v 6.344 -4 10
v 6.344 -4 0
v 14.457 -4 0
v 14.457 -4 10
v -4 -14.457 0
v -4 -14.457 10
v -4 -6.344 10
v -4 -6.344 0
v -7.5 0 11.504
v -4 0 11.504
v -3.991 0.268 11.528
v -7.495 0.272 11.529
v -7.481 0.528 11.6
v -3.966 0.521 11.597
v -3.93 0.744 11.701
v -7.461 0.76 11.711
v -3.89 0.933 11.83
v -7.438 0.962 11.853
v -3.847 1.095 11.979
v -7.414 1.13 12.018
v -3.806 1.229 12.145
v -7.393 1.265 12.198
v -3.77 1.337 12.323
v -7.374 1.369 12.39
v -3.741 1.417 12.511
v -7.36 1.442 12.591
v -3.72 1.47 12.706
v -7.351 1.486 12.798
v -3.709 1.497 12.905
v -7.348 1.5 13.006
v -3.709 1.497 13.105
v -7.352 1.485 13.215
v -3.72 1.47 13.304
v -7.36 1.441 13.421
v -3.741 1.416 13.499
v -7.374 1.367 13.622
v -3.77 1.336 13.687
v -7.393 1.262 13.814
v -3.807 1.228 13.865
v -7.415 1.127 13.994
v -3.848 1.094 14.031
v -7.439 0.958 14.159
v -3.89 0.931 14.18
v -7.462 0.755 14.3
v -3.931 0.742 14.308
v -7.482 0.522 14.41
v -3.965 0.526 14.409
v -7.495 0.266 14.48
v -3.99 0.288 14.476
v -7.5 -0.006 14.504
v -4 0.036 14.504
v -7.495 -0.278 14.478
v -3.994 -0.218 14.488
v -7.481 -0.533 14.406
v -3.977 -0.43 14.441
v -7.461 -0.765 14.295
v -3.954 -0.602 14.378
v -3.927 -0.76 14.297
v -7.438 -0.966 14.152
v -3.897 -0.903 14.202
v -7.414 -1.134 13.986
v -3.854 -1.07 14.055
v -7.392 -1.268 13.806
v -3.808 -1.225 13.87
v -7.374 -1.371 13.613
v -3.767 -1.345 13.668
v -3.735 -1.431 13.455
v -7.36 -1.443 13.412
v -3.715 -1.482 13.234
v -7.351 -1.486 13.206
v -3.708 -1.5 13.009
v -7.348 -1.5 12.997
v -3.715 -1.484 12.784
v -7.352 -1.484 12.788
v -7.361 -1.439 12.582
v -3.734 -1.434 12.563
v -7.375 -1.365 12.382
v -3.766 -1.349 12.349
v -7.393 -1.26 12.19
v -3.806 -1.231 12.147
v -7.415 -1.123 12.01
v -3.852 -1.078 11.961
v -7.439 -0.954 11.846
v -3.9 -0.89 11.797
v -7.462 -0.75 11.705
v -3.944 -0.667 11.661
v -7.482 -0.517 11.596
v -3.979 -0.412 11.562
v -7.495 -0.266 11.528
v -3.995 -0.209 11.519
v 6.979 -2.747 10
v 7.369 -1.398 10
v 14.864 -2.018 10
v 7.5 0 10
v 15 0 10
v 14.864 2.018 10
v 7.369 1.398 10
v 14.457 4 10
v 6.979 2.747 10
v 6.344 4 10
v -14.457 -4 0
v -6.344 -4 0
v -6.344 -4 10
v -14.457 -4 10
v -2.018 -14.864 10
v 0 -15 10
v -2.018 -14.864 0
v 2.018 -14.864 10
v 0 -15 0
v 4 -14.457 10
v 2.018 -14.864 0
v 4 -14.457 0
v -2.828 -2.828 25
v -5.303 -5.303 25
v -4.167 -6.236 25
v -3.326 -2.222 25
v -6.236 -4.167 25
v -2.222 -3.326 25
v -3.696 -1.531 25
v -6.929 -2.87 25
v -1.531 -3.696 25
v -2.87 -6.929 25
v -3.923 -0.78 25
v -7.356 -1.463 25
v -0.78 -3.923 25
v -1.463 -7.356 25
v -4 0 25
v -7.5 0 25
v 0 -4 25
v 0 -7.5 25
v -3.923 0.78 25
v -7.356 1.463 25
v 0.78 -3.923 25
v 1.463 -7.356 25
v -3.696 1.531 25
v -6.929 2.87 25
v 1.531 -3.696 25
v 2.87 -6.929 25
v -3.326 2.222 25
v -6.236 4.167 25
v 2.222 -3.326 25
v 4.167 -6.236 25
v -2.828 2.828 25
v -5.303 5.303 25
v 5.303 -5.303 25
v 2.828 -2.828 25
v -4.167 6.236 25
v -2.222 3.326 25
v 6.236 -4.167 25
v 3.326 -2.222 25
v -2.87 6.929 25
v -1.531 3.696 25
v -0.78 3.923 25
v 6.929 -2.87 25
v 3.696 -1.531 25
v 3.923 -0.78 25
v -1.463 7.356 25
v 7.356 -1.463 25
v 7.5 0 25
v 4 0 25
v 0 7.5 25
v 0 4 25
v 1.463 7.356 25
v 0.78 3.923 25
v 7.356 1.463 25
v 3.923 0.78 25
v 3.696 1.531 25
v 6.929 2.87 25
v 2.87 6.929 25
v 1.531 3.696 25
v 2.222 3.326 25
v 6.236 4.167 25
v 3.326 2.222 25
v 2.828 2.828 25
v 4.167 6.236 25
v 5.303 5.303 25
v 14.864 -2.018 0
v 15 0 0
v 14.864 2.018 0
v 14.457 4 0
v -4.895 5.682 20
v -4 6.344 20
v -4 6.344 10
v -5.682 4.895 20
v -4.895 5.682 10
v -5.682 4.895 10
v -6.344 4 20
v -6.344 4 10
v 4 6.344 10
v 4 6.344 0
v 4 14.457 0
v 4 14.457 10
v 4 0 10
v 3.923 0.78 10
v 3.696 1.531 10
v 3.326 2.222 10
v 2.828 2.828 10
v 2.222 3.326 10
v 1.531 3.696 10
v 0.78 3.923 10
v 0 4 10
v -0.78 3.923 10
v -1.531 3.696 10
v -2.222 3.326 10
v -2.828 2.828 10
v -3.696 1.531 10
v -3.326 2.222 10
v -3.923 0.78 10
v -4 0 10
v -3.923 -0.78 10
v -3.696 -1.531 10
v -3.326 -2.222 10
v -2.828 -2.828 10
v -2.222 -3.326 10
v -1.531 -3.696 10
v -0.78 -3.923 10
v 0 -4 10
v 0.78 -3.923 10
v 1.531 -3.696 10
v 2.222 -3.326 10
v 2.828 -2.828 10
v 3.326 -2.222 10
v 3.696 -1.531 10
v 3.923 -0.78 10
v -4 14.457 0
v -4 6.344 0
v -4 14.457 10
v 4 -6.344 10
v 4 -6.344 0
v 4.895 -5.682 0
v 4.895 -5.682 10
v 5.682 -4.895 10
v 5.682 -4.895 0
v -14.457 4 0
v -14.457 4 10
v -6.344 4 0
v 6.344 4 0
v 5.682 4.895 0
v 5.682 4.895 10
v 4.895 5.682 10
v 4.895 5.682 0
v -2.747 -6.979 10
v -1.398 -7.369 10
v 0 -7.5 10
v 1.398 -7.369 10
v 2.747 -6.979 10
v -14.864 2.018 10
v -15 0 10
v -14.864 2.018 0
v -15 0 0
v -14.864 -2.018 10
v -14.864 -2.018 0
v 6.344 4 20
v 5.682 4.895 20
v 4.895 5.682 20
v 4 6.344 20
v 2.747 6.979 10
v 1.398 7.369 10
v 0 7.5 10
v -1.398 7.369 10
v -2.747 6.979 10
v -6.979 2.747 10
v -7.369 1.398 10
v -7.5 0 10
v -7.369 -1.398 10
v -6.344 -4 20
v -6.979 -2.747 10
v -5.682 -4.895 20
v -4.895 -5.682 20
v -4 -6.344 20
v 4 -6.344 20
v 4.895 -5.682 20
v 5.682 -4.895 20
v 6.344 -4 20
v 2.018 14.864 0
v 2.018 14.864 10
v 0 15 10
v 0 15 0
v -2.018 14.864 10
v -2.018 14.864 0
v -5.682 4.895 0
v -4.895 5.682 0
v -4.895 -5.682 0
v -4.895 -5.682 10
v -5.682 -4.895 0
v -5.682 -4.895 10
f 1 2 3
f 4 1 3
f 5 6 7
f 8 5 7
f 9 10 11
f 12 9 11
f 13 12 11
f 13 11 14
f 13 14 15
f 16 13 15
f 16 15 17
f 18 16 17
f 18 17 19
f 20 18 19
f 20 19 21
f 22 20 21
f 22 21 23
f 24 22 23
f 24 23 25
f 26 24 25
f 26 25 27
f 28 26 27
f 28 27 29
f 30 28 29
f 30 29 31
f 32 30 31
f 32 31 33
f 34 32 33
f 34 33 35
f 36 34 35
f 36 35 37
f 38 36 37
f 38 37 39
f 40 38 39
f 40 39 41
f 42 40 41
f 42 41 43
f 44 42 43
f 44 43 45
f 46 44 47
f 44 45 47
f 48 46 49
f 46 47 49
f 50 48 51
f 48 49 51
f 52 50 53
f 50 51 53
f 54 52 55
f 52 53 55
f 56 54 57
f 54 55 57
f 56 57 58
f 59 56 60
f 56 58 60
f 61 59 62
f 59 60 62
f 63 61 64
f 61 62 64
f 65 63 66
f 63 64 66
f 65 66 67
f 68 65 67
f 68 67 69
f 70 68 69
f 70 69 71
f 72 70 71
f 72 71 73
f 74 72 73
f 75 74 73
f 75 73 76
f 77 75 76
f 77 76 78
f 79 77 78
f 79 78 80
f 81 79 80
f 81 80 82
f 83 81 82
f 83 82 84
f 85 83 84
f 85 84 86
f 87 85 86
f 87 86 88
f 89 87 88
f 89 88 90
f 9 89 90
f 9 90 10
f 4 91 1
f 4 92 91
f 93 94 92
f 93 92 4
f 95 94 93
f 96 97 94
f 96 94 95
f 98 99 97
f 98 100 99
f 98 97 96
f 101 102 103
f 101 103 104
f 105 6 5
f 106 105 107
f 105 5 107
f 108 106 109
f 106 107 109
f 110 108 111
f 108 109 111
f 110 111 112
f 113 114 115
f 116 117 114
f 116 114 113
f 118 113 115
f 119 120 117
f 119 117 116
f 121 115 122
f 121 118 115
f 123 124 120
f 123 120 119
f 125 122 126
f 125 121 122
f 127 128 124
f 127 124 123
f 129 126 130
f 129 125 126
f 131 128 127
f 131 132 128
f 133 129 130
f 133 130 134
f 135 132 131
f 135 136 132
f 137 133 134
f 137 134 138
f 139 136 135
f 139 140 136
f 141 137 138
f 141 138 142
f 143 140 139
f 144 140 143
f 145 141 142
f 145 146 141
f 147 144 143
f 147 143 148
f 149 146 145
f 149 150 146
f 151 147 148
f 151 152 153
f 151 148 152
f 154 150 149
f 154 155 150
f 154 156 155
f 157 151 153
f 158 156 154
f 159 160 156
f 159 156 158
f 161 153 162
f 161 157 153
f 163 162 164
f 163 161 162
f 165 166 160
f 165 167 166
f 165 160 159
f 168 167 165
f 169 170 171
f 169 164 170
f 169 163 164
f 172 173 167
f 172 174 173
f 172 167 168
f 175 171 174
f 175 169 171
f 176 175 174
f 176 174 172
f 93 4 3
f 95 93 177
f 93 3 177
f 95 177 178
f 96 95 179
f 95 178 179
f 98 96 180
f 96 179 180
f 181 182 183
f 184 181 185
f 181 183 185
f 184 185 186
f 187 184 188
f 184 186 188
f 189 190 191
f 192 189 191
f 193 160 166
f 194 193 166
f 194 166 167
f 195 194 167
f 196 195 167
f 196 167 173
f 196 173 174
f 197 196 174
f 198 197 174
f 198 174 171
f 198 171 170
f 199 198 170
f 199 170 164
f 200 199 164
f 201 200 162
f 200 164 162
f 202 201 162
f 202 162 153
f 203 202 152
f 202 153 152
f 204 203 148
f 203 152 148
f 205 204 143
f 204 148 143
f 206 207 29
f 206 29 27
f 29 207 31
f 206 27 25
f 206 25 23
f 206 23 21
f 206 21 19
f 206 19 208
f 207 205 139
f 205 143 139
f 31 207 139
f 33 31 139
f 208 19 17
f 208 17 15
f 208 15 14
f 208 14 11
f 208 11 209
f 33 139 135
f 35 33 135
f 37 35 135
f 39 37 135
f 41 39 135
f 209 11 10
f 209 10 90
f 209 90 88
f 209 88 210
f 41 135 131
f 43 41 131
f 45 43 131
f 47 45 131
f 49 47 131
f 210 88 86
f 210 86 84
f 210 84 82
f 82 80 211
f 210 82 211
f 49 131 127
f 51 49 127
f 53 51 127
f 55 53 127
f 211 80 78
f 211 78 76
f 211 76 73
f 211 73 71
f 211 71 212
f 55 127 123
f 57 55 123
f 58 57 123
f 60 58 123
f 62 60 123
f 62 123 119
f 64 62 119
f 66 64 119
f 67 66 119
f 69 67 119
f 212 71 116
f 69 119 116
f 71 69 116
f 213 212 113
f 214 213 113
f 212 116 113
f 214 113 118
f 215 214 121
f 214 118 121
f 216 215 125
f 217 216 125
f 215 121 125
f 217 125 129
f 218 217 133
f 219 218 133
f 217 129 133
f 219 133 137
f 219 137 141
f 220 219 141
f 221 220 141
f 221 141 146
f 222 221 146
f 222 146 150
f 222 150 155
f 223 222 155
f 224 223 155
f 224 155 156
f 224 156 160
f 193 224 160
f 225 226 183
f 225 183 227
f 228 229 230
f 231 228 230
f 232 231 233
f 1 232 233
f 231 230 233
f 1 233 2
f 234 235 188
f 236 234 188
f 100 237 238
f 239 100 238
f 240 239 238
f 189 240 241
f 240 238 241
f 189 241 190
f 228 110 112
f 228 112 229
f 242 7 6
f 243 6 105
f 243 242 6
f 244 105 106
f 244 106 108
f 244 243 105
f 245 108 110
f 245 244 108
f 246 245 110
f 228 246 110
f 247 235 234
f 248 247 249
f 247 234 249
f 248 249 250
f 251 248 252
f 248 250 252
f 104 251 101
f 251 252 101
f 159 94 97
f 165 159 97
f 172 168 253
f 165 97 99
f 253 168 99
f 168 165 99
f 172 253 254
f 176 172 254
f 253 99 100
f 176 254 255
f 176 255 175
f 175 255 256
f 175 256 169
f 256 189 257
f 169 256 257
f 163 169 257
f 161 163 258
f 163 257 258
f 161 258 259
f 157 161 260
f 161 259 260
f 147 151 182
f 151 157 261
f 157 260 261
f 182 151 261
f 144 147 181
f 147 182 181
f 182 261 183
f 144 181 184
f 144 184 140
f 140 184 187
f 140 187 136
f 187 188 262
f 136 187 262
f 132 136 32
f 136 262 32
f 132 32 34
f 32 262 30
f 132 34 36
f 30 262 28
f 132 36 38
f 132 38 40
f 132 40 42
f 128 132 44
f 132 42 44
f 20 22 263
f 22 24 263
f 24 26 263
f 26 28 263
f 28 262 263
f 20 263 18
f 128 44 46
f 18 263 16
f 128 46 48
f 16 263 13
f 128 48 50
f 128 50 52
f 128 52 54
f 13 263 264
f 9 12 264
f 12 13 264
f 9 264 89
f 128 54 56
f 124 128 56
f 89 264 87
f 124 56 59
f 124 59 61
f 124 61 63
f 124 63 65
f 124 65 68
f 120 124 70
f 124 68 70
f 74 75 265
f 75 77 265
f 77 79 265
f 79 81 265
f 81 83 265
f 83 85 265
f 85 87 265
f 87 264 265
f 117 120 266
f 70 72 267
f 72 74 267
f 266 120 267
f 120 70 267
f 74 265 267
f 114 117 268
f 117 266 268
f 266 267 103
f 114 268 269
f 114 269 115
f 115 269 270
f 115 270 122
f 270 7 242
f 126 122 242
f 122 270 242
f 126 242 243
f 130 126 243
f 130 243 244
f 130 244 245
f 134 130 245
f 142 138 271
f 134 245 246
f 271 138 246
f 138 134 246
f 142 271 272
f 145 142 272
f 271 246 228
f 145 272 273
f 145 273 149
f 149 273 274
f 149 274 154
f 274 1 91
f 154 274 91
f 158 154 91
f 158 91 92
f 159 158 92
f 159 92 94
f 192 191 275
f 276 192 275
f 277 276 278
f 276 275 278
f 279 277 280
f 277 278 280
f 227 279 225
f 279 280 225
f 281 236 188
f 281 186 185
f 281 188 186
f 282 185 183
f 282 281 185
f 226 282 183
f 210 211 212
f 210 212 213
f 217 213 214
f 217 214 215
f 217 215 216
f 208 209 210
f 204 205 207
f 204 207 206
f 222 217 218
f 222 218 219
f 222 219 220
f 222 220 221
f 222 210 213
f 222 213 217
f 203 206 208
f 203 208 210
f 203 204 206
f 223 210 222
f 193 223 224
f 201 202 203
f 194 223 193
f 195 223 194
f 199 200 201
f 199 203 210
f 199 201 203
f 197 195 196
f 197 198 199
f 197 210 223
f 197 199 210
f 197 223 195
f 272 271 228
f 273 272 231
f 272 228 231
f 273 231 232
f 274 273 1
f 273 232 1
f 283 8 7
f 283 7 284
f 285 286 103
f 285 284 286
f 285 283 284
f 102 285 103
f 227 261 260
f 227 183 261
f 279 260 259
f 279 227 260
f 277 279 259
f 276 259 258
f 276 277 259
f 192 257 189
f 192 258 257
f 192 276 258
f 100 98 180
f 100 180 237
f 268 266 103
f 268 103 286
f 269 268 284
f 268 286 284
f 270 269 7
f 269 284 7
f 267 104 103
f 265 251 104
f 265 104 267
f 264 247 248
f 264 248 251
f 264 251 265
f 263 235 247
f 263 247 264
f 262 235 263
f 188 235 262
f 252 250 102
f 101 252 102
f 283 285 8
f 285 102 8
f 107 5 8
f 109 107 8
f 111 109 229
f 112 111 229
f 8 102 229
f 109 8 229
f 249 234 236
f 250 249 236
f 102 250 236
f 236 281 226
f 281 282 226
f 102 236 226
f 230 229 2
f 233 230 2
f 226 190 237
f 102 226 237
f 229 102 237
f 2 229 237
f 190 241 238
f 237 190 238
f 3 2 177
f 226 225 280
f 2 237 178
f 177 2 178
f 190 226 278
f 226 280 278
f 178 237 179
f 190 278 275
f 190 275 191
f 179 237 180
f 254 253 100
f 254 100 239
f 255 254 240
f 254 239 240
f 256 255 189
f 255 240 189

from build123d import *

# Parameters (mm, degrees)
ESBO_O1_R                = 15
RESSALTO_EXTRUS_O1_DEPTH = 10
ESBO_O2_R                = 7.5
RESSALTO_EXTRUS_O2_DEPTH = 15
ESBO_O3_R                = 4
CORTE_EXTRUS_O1_DEPTH    = 15
CORTE_EXTRUS_O2_DEPTH    = 20
ESBO_O5_R                = 1.5
CORTE_EXTRUS_O3_DEPTH    = 20


with BuildPart() as part:
    # Esboço1 → Ressalto-extrusão1 (new body)
    with BuildSketch(Plane.XY):
        Circle(ESBO_O1_R)
    extrude(amount=RESSALTO_EXTRUS_O1_DEPTH)

    # Esboço2 → Ressalto-extrusão2 (add)
    with BuildSketch(Plane.XY.offset(10)):
        Circle(ESBO_O2_R)
    extrude(amount=RESSALTO_EXTRUS_O2_DEPTH)

    # Esboço3 → Corte-extrusão1 (cut)
    with BuildSketch(Plane.XY.offset(25)):
        Circle(ESBO_O3_R)
    extrude(amount=-CORTE_EXTRUS_O1_DEPTH, mode=Mode.SUBTRACT)

    # Esboço4 → Corte-extrusão2 (cut)
    with BuildSketch(Plane(origin=(0, 0, 0), x_dir=(-1, 0, 0), z_dir=(0, 0, -1))):
        with BuildLine():
            Line((-4, 6.34428877), (-4, 14.456832295))
            ThreePointArc((-4, 14.456832295), (-10.606601718, 10.606601718), (-14.456832295, 4))
            Line((-14.456832295, 4), (-6.34428877, 4))
            ThreePointArc((-6.34428877, 4), (-5.303300859, 5.303300859), (-4, 6.34428877))
        make_face()
        with BuildLine():
            Line((4, -14.456832295), (4, -6.34428877))
            ThreePointArc((4, -6.34428877), (5.303300859, -5.303300859), (6.34428877, -4))
            Line((6.34428877, -4), (14.456832295, -4))
            ThreePointArc((14.456832295, -4), (10.606601718, -10.606601718), (4, -14.456832295))
        make_face()
        with BuildLine():
            Line((-4, -14.456832295), (-4, -6.34428877))
            ThreePointArc((-4, -6.34428877), (-5.303300859, -5.303300859), (-6.34428877, -4))
            Line((-6.34428877, -4), (-14.456832295, -4))
            ThreePointArc((-14.456832295, -4), (-10.606601718, -10.606601718), (-4, -14.456832295))
        make_face()
        with BuildLine():
            Line((14.456832295, 4), (6.34428877, 4))
            ThreePointArc((6.34428877, 4), (5.303300859, 5.303300859), (4, 6.34428877))
            Line((4, 6.34428877), (4, 14.456832295))
            ThreePointArc((4, 14.456832295), (10.606601718, 10.606601718), (14.456832295, 4))
        make_face()
    extrude(amount=-CORTE_EXTRUS_O2_DEPTH, mode=Mode.SUBTRACT)

    # Esboço5 → Corte-extrusão3 (cut)
    with BuildSketch(Plane(origin=(0, 0, 0), x_dir=(0, 0, -1), z_dir=(1, 0, 0))):
        with Locations((-13.004040431, 0)):
            Circle(ESBO_O5_R)
    extrude(amount=-CORTE_EXTRUS_O3_DEPTH, mode=Mode.SUBTRACT)


solid = part.part
